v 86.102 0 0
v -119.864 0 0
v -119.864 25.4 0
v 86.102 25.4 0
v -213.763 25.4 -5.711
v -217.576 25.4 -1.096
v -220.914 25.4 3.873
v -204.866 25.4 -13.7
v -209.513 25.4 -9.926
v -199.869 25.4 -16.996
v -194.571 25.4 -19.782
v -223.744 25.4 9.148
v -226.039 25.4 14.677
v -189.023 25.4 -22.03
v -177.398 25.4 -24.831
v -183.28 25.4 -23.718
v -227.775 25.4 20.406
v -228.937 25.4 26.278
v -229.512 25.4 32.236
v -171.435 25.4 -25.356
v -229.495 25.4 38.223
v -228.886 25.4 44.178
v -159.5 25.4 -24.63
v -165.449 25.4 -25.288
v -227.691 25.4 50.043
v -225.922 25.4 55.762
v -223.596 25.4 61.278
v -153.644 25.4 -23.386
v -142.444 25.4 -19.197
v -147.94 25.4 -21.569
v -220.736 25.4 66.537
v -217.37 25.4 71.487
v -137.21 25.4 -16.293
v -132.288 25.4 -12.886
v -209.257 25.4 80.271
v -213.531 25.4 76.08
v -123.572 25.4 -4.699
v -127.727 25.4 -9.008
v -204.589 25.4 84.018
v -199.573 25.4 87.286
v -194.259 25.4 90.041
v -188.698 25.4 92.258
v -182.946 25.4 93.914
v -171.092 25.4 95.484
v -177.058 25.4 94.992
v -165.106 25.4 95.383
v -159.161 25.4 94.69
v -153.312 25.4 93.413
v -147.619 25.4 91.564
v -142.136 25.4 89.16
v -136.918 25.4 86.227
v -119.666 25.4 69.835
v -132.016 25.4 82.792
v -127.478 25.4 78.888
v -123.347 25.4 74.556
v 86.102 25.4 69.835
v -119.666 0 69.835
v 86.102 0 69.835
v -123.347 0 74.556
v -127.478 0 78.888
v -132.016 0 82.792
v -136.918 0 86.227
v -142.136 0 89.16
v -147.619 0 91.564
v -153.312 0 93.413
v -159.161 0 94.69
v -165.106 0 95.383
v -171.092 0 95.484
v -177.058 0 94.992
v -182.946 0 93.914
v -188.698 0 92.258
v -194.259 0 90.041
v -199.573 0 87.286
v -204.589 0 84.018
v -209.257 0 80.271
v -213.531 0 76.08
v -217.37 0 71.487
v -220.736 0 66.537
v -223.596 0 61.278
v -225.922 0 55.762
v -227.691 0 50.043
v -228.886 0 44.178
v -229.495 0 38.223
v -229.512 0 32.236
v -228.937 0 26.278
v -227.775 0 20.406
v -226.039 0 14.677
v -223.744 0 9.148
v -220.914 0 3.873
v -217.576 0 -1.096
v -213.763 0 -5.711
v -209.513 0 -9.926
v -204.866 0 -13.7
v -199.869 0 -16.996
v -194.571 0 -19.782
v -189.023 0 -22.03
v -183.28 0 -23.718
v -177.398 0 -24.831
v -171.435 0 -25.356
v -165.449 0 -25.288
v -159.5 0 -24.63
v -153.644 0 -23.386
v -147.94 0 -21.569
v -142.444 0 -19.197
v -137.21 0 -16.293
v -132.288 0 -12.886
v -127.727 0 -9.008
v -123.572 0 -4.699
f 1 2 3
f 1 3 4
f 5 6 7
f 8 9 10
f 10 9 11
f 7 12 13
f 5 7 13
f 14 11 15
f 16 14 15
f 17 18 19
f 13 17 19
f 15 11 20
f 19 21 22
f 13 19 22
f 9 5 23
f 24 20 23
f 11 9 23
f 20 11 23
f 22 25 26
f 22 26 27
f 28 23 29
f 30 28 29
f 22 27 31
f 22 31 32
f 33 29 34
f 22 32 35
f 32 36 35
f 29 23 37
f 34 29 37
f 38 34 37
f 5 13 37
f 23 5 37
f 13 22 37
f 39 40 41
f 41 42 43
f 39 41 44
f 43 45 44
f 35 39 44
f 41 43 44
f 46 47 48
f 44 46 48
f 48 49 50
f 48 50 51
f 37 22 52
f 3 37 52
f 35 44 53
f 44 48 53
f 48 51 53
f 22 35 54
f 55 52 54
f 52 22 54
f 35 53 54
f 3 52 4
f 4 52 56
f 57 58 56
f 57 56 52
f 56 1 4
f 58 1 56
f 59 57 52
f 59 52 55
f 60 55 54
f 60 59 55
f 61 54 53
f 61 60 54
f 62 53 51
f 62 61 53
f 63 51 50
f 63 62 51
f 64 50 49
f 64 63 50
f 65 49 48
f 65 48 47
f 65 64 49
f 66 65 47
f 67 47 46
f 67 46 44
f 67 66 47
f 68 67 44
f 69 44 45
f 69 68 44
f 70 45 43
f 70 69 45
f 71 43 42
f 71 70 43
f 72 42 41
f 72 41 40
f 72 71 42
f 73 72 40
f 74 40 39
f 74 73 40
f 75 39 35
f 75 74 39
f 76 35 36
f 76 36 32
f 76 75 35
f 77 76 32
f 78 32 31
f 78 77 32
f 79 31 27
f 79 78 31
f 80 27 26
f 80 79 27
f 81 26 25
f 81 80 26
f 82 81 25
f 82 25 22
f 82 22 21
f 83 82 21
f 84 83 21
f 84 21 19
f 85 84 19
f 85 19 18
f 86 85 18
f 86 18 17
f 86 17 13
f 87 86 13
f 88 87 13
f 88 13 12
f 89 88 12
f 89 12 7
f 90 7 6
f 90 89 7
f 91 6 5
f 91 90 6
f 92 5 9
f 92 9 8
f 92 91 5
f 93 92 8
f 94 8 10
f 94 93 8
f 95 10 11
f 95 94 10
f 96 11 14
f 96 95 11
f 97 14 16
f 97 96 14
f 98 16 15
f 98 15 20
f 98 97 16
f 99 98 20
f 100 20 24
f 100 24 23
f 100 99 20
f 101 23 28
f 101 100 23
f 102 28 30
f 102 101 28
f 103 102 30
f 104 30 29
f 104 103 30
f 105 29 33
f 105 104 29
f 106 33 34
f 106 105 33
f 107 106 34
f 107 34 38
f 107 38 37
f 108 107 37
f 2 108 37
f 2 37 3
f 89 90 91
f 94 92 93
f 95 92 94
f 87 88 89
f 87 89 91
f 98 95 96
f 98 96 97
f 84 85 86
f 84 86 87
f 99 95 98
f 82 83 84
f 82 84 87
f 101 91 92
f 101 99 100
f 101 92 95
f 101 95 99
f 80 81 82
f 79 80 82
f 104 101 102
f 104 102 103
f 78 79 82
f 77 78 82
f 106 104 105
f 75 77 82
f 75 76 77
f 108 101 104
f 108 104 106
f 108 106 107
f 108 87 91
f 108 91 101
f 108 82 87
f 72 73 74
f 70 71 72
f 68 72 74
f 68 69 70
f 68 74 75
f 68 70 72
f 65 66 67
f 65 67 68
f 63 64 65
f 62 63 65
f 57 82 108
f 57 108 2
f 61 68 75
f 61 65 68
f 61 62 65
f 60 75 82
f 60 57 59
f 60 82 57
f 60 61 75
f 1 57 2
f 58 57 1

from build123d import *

# Parameters (mm, degrees)
F1_DEPTH = 25.4
F2_DEPTH = 25.4
F3_DEPTH = 25.4


with BuildPart() as f1:
    # F0 (on Front) → F1 (new body)
    with BuildSketch(Plane.XZ):
        with BuildLine():
            ThreePointArc((-119.86399662, 0), (-111.5302178098, 16.6558061897), (-108.6615478184, 35.0579387173))
            ThreePointArc((-108.6615478184, 35.0579387173), (-111.4781642304, 53.2963683876), (-119.6655722325, 69.8354129505))
            Line((-119.6655722325, 69.8354129505), (-201.6532506958, 69.8354129505))
            Line((-201.6532506958, 69.8354129505), (-201.6532506958, 0))
            Line((-201.6532506958, 0), (-119.86399662, 0))
        make_face()
        with BuildLine():
            ThreePointArc((-119.6655722325, 69.8354129505), (-111.4781642304, 53.2963683876), (-108.6615478184, 35.0579387173))
            ThreePointArc((-108.6615478184, 35.0579387173), (-111.5302178098, 16.6558061897), (-119.86399662, 0))
            Line((-119.86399662, 0), (86.1022950306, 0))
            Line((86.1022950306, 0), (86.1022950306, 69.8354129505))
            Line((86.1022950306, 69.8354129505), (-119.6655722325, 69.8354129505))
        make_face()
        with BuildLine():
            Line((-201.6532506958, 69.8354129505), (-119.6655722325, 69.8354129505))
            ThreePointArc((-119.6655722325, 69.8354129505), (-229.5771812139, 35.2297180557), (-119.86399662, 0))
            Line((-119.86399662, 0), (-201.6532506958, 0))
            Line((-201.6532506958, 0), (-201.6532506958, 69.8354129505))
        make_face()
    extrude(amount=F1_DEPTH)

    # F2 (add): a face of the model
    f2_faces = [f1.faces().sort_by_distance(p)[0] for p in [
        (-83.8129637721, 0, 34.9783538695),
    ]]
    extrude(f2_faces, amount=F2_DEPTH)

    # F3 (cut): a face of the model
    f3_faces = [f1.faces().sort_by_distance(p)[0] for p in [
        (-83.8129637721, -25.4, 34.9783538695),
    ]]
    extrude(f3_faces, amount=-F3_DEPTH, mode=Mode.SUBTRACT)


solid = f1.part
